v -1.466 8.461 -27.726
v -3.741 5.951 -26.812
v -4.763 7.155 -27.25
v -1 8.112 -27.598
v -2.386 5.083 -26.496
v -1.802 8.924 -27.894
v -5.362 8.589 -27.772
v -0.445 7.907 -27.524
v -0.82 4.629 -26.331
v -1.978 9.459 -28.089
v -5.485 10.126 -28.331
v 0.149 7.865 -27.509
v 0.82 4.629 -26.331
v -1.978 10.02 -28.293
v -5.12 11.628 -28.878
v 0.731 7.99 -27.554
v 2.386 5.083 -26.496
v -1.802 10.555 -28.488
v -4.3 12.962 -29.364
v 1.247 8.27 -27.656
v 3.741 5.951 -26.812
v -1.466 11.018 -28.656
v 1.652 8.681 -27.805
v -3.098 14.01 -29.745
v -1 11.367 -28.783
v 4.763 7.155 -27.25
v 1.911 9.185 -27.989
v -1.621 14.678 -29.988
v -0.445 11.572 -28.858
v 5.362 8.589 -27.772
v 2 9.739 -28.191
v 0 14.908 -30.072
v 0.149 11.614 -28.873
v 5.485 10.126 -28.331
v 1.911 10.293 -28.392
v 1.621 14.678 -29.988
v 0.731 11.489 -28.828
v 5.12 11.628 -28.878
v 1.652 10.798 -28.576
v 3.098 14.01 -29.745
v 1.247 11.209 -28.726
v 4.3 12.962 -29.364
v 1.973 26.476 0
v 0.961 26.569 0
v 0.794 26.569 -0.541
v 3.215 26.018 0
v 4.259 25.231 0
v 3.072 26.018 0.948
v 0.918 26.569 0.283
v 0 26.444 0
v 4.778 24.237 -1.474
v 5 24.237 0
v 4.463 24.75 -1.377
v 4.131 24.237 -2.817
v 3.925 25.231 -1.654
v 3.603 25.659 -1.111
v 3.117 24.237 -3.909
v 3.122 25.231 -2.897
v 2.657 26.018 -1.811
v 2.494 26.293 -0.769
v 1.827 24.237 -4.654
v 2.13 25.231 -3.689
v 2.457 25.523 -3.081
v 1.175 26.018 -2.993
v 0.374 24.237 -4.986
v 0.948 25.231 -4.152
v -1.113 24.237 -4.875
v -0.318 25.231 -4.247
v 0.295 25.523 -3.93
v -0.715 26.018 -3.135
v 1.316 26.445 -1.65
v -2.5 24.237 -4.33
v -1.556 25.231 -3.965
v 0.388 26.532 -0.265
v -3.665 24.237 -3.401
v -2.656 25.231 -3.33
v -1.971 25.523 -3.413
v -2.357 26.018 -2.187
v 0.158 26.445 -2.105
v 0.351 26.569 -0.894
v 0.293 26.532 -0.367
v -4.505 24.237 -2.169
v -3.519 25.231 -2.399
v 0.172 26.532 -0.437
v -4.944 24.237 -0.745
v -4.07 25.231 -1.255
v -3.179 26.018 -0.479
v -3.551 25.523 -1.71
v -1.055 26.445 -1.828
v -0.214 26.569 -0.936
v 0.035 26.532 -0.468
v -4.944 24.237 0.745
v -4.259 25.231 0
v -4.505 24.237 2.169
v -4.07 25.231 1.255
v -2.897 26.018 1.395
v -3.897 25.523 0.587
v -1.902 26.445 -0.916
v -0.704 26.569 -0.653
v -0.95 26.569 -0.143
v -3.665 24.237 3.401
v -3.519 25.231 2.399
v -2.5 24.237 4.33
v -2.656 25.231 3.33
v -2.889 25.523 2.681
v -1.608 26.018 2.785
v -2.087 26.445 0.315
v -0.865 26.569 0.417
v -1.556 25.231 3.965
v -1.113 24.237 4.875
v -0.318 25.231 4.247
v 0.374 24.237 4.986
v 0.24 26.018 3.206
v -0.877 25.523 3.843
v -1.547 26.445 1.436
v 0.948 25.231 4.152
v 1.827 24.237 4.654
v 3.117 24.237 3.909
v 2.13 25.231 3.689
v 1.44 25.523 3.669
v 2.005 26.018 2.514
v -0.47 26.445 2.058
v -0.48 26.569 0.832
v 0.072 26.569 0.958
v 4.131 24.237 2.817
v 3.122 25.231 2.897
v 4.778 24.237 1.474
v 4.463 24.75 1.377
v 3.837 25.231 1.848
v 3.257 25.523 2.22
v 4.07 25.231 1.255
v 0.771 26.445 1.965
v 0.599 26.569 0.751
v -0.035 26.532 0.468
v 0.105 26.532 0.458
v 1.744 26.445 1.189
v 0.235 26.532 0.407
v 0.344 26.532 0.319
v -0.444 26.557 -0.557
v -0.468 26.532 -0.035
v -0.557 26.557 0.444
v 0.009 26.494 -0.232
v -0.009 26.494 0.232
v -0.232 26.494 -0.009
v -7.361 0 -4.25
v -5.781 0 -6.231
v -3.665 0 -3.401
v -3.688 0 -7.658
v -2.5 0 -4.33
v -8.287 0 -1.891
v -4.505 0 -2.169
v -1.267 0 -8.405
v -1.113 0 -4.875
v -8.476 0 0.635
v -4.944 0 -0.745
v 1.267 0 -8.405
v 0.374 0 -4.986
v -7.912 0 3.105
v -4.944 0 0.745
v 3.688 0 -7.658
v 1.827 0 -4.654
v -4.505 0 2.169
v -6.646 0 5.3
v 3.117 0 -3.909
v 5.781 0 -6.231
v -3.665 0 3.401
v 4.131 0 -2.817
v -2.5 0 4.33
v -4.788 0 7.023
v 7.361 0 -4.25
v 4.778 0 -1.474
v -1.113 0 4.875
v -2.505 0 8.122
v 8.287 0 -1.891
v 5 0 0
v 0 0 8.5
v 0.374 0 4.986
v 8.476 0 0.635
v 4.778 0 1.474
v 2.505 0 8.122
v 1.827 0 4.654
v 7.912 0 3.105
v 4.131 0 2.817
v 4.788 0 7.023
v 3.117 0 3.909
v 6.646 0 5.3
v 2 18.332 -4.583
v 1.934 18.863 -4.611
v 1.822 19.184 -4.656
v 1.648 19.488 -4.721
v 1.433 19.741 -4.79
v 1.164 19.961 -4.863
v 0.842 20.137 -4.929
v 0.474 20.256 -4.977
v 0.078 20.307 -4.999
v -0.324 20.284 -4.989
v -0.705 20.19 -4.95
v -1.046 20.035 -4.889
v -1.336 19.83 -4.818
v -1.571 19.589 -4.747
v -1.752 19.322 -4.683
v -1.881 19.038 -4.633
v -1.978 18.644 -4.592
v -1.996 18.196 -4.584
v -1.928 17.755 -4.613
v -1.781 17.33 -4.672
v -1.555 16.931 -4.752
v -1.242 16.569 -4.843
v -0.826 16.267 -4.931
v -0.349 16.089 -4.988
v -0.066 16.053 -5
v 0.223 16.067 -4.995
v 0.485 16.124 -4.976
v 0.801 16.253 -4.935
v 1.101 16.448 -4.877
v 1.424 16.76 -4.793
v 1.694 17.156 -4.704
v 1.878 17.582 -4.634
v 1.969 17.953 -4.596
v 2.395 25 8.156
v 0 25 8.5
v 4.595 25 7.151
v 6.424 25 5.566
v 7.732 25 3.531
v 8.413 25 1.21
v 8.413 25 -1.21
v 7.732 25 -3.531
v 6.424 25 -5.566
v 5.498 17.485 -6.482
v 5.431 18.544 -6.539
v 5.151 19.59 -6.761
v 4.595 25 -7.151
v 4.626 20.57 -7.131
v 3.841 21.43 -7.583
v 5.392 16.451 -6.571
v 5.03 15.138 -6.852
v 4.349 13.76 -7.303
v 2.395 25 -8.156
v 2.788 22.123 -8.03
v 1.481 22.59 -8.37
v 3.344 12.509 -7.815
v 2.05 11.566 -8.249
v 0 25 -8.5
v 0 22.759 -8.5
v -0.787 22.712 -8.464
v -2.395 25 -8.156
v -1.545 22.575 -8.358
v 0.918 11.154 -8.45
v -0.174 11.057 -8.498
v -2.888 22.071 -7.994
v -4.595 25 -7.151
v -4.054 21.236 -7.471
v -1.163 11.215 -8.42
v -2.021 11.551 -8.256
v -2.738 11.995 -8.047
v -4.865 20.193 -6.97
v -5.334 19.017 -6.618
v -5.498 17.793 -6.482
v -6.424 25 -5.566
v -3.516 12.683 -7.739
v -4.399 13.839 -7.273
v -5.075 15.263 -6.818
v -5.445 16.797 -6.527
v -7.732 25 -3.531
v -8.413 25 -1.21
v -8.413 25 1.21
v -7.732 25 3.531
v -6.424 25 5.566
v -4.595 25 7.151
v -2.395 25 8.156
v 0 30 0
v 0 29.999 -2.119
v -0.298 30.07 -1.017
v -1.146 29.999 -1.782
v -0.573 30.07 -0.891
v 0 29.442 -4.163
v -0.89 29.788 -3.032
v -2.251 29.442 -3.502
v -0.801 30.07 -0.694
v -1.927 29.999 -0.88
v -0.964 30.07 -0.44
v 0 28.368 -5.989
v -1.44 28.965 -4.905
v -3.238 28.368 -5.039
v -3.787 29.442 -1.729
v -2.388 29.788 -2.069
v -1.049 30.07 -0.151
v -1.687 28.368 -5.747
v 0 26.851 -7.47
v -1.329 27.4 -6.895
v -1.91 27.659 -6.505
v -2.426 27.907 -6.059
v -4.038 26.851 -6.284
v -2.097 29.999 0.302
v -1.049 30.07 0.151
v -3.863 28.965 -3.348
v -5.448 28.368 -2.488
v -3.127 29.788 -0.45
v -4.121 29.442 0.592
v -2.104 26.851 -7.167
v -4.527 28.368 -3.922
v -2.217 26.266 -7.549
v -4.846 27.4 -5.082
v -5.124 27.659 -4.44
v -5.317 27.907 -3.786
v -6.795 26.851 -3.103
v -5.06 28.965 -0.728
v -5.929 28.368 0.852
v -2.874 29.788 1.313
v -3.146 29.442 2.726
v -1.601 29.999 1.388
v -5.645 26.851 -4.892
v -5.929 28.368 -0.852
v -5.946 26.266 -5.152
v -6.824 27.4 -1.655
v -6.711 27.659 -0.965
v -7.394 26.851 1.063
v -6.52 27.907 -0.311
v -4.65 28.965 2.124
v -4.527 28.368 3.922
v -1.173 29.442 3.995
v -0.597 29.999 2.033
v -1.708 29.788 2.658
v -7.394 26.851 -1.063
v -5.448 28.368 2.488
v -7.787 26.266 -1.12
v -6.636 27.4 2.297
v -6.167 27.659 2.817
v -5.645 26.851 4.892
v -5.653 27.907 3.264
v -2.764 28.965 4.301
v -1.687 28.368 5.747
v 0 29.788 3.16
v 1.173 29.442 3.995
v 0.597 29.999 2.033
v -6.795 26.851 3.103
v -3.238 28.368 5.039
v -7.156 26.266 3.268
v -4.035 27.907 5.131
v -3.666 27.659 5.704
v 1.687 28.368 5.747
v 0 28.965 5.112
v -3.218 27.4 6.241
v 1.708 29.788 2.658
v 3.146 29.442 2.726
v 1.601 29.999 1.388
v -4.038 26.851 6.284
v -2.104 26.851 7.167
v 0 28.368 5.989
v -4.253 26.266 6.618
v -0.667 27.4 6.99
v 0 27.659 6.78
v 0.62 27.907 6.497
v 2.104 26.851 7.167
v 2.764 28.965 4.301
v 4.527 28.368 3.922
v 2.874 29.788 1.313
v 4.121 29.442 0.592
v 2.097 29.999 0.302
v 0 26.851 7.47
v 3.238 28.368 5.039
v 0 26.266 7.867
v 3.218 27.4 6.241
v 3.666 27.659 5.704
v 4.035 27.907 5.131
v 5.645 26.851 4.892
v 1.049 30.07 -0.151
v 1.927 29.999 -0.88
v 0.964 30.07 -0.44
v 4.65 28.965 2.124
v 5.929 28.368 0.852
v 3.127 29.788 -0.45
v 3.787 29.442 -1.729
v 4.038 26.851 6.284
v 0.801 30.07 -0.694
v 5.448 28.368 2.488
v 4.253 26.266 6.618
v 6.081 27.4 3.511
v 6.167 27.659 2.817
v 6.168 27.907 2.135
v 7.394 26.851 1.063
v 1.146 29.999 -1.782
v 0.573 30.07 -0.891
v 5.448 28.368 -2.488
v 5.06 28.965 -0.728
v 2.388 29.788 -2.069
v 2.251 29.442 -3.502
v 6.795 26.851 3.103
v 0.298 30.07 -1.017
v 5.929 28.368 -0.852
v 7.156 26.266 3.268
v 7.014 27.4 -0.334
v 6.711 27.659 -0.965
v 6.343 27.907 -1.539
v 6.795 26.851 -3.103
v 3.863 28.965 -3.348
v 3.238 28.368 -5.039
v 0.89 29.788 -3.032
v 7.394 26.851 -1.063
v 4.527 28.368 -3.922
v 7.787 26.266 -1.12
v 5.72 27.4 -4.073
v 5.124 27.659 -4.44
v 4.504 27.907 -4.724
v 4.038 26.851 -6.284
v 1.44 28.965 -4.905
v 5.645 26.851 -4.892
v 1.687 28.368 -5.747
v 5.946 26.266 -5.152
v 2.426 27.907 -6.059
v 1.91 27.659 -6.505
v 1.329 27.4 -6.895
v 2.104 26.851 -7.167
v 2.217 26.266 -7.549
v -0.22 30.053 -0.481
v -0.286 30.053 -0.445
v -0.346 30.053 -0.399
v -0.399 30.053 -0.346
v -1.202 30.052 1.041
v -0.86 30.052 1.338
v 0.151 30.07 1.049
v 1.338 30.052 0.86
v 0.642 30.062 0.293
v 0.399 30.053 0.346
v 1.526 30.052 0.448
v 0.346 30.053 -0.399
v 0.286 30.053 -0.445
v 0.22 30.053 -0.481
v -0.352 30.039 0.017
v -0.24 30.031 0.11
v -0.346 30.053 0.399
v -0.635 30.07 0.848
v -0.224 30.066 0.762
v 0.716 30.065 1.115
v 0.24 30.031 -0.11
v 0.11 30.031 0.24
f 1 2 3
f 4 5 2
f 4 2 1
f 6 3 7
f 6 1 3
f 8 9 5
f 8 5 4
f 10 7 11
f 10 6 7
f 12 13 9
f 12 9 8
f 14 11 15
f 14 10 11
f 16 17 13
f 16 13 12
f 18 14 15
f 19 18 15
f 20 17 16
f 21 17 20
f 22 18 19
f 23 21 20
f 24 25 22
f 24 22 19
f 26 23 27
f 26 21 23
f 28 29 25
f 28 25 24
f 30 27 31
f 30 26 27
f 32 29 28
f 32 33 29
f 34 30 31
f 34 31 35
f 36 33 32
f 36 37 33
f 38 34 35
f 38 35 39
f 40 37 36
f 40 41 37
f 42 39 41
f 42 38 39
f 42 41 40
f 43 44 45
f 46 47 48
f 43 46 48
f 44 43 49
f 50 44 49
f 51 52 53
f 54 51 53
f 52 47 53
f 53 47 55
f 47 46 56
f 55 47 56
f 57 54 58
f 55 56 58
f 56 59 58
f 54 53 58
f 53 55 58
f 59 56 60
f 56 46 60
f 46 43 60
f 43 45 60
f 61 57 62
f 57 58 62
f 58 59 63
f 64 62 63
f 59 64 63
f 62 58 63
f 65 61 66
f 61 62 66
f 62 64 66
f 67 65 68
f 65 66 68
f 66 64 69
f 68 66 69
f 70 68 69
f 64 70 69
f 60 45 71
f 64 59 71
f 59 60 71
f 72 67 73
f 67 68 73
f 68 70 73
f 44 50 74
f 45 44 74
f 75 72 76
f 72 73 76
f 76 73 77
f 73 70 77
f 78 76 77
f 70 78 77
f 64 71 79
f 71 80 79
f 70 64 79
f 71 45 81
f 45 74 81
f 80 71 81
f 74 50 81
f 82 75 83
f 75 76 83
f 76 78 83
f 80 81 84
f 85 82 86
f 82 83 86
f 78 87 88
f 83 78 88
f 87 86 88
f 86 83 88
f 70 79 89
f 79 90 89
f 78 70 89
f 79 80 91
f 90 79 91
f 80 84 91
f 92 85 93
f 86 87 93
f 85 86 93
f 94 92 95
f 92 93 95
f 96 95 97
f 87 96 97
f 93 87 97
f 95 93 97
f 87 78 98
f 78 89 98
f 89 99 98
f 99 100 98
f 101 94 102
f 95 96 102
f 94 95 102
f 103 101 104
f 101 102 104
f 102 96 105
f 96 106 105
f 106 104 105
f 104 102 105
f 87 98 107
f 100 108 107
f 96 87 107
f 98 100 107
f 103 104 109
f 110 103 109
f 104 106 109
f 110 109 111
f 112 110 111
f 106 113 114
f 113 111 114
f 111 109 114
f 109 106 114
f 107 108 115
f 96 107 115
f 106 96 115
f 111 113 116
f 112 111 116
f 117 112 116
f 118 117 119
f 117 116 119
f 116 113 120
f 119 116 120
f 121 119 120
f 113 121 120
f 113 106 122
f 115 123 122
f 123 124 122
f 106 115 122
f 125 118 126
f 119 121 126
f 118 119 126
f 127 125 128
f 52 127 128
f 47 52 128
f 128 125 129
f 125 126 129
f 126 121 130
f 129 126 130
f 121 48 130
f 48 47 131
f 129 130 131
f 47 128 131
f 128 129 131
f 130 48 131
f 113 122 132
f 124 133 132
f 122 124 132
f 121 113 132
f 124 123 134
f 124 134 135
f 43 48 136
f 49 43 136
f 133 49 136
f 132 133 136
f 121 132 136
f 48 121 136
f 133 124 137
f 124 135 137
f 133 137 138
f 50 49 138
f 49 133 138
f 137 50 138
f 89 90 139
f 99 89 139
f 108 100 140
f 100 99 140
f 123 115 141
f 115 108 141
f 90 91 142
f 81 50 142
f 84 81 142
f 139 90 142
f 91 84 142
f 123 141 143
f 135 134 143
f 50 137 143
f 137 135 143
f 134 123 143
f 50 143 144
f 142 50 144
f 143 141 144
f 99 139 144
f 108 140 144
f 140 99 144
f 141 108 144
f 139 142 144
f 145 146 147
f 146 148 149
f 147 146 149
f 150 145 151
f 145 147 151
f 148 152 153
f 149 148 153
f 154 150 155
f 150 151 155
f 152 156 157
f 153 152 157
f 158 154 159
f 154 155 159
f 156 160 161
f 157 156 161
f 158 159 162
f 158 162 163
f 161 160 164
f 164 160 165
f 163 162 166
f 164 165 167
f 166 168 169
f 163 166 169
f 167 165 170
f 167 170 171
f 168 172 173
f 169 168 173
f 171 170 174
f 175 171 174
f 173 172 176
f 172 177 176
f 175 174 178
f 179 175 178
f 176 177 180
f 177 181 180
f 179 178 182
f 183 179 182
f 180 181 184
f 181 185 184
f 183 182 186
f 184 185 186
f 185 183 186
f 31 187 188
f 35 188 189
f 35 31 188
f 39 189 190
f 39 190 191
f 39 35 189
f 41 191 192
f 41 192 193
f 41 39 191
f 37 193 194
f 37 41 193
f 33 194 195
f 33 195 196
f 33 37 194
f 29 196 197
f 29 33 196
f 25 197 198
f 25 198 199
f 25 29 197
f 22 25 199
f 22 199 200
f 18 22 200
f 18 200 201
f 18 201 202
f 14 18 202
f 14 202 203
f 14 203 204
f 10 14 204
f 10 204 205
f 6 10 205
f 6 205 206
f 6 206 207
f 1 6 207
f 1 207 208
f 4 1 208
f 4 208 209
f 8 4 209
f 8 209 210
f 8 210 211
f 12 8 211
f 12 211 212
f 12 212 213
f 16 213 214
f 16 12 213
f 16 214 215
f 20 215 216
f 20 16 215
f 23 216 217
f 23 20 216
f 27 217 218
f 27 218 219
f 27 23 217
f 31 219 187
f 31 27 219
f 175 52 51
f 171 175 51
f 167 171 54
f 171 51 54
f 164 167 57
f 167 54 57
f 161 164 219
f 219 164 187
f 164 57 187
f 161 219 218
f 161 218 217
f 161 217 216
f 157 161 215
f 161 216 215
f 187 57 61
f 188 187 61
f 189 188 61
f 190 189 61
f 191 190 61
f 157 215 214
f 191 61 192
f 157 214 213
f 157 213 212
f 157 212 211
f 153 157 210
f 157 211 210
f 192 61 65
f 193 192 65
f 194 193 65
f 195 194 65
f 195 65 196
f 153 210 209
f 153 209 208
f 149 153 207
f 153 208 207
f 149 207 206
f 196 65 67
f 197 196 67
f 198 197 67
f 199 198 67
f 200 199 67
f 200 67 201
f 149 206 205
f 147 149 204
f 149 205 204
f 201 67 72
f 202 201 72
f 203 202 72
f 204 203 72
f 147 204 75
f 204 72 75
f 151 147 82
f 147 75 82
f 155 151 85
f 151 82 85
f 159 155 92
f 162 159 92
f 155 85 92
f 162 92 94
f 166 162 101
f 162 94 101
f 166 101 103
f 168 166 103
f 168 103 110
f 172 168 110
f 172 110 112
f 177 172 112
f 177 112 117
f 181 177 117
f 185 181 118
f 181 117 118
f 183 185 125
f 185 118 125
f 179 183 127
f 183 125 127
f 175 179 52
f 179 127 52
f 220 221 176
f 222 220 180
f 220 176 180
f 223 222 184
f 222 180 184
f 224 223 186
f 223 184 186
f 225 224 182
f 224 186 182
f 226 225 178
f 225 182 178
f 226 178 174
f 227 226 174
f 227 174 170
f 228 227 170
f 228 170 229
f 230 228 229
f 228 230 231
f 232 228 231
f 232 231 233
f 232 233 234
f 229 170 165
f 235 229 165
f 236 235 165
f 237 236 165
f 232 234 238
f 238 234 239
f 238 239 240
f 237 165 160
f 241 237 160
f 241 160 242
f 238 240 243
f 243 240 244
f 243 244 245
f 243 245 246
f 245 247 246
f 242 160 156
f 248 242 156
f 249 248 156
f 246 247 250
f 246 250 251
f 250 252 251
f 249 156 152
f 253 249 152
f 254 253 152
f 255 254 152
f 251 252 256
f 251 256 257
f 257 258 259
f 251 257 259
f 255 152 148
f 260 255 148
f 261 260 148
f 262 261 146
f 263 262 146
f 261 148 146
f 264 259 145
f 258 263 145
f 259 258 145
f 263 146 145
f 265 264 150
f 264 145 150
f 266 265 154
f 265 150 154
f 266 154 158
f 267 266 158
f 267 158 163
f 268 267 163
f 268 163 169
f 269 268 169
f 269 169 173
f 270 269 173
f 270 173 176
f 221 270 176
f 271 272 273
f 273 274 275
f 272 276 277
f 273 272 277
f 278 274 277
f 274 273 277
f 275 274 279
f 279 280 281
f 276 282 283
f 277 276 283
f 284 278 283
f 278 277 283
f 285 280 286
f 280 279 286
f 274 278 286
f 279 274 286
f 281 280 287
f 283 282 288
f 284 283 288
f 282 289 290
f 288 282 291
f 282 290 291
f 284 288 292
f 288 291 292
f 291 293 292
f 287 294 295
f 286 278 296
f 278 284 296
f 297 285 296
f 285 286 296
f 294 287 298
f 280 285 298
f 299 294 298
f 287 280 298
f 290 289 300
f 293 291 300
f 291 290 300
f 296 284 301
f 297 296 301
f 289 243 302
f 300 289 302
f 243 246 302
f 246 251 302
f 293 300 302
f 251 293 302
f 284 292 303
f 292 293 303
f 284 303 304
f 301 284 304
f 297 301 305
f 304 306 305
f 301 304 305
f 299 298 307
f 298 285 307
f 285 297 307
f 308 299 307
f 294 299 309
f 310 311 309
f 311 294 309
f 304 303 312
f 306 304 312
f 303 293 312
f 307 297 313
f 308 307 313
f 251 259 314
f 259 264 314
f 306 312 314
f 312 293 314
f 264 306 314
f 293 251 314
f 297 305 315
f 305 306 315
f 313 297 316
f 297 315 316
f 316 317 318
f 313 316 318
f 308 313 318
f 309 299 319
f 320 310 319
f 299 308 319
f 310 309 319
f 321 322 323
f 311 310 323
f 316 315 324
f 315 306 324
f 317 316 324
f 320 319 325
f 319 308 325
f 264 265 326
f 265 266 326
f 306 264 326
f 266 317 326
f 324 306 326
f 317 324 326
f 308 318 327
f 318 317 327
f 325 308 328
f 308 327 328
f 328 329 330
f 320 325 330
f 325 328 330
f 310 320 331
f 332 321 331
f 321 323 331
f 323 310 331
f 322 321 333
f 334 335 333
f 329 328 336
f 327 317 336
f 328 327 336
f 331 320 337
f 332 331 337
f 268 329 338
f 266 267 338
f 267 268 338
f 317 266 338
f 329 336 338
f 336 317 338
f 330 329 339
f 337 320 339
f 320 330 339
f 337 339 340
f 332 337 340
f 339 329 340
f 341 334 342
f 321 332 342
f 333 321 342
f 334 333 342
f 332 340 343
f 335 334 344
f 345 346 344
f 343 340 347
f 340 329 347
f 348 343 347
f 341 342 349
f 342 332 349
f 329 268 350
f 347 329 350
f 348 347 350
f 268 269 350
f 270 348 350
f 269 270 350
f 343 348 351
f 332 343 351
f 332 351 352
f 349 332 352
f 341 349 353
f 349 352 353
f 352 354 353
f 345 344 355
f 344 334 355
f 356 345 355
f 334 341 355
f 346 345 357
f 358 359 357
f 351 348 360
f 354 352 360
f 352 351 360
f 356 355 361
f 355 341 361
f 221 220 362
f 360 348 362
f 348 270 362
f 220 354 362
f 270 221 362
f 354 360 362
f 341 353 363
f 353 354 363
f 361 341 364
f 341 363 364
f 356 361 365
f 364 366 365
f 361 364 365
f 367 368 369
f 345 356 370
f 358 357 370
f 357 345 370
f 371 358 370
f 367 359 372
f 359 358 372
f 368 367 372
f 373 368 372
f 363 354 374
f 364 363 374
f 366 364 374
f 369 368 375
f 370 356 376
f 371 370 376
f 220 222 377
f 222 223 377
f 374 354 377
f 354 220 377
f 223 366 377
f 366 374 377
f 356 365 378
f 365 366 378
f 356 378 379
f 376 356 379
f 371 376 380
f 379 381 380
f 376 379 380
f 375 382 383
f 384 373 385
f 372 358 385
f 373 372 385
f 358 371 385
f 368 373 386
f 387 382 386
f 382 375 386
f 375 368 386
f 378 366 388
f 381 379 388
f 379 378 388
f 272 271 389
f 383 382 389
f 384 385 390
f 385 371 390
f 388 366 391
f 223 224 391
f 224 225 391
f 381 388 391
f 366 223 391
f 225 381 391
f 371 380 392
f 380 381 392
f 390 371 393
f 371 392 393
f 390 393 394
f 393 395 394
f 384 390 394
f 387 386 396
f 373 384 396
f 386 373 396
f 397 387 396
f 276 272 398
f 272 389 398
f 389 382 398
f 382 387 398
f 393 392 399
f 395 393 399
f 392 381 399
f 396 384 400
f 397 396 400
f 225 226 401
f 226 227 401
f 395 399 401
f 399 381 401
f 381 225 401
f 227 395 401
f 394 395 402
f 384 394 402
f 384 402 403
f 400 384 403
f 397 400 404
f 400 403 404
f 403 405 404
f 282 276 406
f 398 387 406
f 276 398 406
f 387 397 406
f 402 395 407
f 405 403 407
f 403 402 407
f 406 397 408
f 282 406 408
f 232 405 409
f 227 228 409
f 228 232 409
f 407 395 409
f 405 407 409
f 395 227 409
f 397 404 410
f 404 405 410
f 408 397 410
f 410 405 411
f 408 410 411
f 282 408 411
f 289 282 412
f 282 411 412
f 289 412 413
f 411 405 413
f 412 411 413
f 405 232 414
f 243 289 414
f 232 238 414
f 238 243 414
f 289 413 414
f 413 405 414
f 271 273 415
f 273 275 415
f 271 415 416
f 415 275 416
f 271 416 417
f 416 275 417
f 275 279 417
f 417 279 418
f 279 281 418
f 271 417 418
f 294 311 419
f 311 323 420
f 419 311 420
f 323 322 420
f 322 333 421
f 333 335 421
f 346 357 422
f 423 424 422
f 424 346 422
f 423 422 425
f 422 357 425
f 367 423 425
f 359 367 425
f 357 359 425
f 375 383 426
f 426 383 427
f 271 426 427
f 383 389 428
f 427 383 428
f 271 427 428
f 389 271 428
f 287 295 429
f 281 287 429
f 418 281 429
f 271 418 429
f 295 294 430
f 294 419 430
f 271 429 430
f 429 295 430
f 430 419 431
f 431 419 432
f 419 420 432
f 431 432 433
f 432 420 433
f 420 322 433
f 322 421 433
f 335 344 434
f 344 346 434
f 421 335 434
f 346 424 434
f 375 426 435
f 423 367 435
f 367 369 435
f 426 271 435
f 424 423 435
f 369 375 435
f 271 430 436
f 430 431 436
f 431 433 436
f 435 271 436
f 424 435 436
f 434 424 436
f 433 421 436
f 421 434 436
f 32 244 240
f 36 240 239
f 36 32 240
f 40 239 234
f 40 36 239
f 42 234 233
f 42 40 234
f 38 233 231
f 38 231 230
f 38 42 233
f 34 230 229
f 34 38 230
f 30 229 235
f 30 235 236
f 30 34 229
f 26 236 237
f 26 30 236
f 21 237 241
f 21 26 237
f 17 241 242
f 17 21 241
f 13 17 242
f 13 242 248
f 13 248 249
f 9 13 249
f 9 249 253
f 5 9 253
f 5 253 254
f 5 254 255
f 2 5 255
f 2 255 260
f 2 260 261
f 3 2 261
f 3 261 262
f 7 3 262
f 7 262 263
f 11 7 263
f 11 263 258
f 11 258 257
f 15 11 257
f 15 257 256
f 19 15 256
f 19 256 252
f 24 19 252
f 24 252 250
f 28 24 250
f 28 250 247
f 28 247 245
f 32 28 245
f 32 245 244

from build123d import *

# Parameters (mm, degrees)
SKETCH1_R                = 8.5
BOSS_EXTRUDE1_DEPTH      = 25
BOSS_EXTRUDE2_REACH      = 44.799
BOSS_EXTRUDE2_END_RADIUS = 8.5
SKETCH4_R                = 5.5
SHELL1_START             = -23.159597133
SHELL1_2_OUTLINE_R       = 2
SHELL1_2_DEPTH           = 26.159597133


with BuildPart() as part:
    # Sketch1 → Boss-Extrude1 (new body)
    with BuildSketch(Plane(origin=(0, 0, 0), x_dir=(1, 0, 0), z_dir=(0, 1, 0))):
        with Locations(Location((0, 0, 0), (0, 0, 270))):
            Circle(SKETCH1_R)
    extrude(amount=BOSS_EXTRUDE1_DEPTH)

    # Sketch2 → Revolve1 (revolve)
    with BuildSketch(Plane(origin=(0, 0, 0), x_dir=(0, 0, -1), z_dir=(1, 0, 0))):
        with BuildLine():
            Line((0, 25), (0, 30))
            ThreePointArc((0, 30), (5.112034816, 28.965459187), (8.5, 25))
            Line((8.5, 25), (0, 25))
        make_face()
    revolve(axis=Axis((0, 25, 0), (0, 1, 0)))

    # Boss-Extrude2: up to this cylinder (the profile starts outside it)
    boss_extrude2_end = Plane(origin=(0, 9.739396, 0), z_dir=(0, -1, 0)) * Cylinder(BOSS_EXTRUDE2_END_RADIUS, 107.598, mode=Mode.PRIVATE)
    # Sketch4 → Boss-Extrude2 (add, up to the surface)
    with BuildSketch(Plane(origin=(0, 9.7393957, -28.190778624), x_dir=(-1, 0, 0), z_dir=(0, -0.3420201433256657, -0.9396926207859096)), mode=Mode.PRIVATE) as boss_extrude2_sk1:
        with Locations(Location((0, 0, 0), (0, 0, 90))):
            Circle(SKETCH4_R)
    boss_extrude2_tool1 = extrude(boss_extrude2_sk1.sketch, amount=-BOSS_EXTRUDE2_REACH, mode=Mode.PRIVATE) - boss_extrude2_end
    add(boss_extrude2_tool1.solids().sort_by_distance((0, 9.739396, -28.190779))[0])

    # Shell1: read off the stored shape, not the designer's step
    # Shell1 outline → Shell1 (revolve, cut)
    with BuildSketch(Plane.XY):
        with BuildLine():
            Line((0, 26.444357479), (0, 0))
            Line((0, 0), (5, 0))
            Line((5, 0), (5, 24.236519229))
            add(Edge.make_bspline(
                [(5, 24.236519229), (4.572818275, 25.014193993), (3.910724446, 25.762107964), (3.017623345, 26.318986428), (2.002643397, 26.569985468), (0.836195706, 26.569985465), (0.619342604, 26.556580246), (0.406891162, 26.530460172), (0.200126847, 26.492663543), (0, 26.444357479)],
                knots=[4.721376583, 4.721376583, 4.721376583, 4.721376583, 4.721376583, 4.721376583, 5.780874766, 5.780874766, 5.780874766, 5.780874766, 6.026709165, 6.026709165, 6.026709165, 6.026709165, 6.026709165, 6.026709165], degree=5, weights=[1, 1, 0.993014221, 0.992005425, 1, 1, 0.999993273, 0.999995808, 1, 1]))
        make_face()
    revolve(axis=Axis((0, 0, 0), (0, 1, 0)), mode=Mode.SUBTRACT)

    # Shell1 2 outline → Shell1 2 (cut)
    with BuildSketch(Plane(origin=(0, 0, 0), x_dir=(1, 0, 0), z_dir=(0, 0.34202014332566616, 0.9396926207859094)).offset(SHELL1_START)):
        with Locations((0, 18.793852416)):
            Circle(SHELL1_2_OUTLINE_R)
    extrude(amount=SHELL1_2_DEPTH, mode=Mode.SUBTRACT)


solid = part.part
